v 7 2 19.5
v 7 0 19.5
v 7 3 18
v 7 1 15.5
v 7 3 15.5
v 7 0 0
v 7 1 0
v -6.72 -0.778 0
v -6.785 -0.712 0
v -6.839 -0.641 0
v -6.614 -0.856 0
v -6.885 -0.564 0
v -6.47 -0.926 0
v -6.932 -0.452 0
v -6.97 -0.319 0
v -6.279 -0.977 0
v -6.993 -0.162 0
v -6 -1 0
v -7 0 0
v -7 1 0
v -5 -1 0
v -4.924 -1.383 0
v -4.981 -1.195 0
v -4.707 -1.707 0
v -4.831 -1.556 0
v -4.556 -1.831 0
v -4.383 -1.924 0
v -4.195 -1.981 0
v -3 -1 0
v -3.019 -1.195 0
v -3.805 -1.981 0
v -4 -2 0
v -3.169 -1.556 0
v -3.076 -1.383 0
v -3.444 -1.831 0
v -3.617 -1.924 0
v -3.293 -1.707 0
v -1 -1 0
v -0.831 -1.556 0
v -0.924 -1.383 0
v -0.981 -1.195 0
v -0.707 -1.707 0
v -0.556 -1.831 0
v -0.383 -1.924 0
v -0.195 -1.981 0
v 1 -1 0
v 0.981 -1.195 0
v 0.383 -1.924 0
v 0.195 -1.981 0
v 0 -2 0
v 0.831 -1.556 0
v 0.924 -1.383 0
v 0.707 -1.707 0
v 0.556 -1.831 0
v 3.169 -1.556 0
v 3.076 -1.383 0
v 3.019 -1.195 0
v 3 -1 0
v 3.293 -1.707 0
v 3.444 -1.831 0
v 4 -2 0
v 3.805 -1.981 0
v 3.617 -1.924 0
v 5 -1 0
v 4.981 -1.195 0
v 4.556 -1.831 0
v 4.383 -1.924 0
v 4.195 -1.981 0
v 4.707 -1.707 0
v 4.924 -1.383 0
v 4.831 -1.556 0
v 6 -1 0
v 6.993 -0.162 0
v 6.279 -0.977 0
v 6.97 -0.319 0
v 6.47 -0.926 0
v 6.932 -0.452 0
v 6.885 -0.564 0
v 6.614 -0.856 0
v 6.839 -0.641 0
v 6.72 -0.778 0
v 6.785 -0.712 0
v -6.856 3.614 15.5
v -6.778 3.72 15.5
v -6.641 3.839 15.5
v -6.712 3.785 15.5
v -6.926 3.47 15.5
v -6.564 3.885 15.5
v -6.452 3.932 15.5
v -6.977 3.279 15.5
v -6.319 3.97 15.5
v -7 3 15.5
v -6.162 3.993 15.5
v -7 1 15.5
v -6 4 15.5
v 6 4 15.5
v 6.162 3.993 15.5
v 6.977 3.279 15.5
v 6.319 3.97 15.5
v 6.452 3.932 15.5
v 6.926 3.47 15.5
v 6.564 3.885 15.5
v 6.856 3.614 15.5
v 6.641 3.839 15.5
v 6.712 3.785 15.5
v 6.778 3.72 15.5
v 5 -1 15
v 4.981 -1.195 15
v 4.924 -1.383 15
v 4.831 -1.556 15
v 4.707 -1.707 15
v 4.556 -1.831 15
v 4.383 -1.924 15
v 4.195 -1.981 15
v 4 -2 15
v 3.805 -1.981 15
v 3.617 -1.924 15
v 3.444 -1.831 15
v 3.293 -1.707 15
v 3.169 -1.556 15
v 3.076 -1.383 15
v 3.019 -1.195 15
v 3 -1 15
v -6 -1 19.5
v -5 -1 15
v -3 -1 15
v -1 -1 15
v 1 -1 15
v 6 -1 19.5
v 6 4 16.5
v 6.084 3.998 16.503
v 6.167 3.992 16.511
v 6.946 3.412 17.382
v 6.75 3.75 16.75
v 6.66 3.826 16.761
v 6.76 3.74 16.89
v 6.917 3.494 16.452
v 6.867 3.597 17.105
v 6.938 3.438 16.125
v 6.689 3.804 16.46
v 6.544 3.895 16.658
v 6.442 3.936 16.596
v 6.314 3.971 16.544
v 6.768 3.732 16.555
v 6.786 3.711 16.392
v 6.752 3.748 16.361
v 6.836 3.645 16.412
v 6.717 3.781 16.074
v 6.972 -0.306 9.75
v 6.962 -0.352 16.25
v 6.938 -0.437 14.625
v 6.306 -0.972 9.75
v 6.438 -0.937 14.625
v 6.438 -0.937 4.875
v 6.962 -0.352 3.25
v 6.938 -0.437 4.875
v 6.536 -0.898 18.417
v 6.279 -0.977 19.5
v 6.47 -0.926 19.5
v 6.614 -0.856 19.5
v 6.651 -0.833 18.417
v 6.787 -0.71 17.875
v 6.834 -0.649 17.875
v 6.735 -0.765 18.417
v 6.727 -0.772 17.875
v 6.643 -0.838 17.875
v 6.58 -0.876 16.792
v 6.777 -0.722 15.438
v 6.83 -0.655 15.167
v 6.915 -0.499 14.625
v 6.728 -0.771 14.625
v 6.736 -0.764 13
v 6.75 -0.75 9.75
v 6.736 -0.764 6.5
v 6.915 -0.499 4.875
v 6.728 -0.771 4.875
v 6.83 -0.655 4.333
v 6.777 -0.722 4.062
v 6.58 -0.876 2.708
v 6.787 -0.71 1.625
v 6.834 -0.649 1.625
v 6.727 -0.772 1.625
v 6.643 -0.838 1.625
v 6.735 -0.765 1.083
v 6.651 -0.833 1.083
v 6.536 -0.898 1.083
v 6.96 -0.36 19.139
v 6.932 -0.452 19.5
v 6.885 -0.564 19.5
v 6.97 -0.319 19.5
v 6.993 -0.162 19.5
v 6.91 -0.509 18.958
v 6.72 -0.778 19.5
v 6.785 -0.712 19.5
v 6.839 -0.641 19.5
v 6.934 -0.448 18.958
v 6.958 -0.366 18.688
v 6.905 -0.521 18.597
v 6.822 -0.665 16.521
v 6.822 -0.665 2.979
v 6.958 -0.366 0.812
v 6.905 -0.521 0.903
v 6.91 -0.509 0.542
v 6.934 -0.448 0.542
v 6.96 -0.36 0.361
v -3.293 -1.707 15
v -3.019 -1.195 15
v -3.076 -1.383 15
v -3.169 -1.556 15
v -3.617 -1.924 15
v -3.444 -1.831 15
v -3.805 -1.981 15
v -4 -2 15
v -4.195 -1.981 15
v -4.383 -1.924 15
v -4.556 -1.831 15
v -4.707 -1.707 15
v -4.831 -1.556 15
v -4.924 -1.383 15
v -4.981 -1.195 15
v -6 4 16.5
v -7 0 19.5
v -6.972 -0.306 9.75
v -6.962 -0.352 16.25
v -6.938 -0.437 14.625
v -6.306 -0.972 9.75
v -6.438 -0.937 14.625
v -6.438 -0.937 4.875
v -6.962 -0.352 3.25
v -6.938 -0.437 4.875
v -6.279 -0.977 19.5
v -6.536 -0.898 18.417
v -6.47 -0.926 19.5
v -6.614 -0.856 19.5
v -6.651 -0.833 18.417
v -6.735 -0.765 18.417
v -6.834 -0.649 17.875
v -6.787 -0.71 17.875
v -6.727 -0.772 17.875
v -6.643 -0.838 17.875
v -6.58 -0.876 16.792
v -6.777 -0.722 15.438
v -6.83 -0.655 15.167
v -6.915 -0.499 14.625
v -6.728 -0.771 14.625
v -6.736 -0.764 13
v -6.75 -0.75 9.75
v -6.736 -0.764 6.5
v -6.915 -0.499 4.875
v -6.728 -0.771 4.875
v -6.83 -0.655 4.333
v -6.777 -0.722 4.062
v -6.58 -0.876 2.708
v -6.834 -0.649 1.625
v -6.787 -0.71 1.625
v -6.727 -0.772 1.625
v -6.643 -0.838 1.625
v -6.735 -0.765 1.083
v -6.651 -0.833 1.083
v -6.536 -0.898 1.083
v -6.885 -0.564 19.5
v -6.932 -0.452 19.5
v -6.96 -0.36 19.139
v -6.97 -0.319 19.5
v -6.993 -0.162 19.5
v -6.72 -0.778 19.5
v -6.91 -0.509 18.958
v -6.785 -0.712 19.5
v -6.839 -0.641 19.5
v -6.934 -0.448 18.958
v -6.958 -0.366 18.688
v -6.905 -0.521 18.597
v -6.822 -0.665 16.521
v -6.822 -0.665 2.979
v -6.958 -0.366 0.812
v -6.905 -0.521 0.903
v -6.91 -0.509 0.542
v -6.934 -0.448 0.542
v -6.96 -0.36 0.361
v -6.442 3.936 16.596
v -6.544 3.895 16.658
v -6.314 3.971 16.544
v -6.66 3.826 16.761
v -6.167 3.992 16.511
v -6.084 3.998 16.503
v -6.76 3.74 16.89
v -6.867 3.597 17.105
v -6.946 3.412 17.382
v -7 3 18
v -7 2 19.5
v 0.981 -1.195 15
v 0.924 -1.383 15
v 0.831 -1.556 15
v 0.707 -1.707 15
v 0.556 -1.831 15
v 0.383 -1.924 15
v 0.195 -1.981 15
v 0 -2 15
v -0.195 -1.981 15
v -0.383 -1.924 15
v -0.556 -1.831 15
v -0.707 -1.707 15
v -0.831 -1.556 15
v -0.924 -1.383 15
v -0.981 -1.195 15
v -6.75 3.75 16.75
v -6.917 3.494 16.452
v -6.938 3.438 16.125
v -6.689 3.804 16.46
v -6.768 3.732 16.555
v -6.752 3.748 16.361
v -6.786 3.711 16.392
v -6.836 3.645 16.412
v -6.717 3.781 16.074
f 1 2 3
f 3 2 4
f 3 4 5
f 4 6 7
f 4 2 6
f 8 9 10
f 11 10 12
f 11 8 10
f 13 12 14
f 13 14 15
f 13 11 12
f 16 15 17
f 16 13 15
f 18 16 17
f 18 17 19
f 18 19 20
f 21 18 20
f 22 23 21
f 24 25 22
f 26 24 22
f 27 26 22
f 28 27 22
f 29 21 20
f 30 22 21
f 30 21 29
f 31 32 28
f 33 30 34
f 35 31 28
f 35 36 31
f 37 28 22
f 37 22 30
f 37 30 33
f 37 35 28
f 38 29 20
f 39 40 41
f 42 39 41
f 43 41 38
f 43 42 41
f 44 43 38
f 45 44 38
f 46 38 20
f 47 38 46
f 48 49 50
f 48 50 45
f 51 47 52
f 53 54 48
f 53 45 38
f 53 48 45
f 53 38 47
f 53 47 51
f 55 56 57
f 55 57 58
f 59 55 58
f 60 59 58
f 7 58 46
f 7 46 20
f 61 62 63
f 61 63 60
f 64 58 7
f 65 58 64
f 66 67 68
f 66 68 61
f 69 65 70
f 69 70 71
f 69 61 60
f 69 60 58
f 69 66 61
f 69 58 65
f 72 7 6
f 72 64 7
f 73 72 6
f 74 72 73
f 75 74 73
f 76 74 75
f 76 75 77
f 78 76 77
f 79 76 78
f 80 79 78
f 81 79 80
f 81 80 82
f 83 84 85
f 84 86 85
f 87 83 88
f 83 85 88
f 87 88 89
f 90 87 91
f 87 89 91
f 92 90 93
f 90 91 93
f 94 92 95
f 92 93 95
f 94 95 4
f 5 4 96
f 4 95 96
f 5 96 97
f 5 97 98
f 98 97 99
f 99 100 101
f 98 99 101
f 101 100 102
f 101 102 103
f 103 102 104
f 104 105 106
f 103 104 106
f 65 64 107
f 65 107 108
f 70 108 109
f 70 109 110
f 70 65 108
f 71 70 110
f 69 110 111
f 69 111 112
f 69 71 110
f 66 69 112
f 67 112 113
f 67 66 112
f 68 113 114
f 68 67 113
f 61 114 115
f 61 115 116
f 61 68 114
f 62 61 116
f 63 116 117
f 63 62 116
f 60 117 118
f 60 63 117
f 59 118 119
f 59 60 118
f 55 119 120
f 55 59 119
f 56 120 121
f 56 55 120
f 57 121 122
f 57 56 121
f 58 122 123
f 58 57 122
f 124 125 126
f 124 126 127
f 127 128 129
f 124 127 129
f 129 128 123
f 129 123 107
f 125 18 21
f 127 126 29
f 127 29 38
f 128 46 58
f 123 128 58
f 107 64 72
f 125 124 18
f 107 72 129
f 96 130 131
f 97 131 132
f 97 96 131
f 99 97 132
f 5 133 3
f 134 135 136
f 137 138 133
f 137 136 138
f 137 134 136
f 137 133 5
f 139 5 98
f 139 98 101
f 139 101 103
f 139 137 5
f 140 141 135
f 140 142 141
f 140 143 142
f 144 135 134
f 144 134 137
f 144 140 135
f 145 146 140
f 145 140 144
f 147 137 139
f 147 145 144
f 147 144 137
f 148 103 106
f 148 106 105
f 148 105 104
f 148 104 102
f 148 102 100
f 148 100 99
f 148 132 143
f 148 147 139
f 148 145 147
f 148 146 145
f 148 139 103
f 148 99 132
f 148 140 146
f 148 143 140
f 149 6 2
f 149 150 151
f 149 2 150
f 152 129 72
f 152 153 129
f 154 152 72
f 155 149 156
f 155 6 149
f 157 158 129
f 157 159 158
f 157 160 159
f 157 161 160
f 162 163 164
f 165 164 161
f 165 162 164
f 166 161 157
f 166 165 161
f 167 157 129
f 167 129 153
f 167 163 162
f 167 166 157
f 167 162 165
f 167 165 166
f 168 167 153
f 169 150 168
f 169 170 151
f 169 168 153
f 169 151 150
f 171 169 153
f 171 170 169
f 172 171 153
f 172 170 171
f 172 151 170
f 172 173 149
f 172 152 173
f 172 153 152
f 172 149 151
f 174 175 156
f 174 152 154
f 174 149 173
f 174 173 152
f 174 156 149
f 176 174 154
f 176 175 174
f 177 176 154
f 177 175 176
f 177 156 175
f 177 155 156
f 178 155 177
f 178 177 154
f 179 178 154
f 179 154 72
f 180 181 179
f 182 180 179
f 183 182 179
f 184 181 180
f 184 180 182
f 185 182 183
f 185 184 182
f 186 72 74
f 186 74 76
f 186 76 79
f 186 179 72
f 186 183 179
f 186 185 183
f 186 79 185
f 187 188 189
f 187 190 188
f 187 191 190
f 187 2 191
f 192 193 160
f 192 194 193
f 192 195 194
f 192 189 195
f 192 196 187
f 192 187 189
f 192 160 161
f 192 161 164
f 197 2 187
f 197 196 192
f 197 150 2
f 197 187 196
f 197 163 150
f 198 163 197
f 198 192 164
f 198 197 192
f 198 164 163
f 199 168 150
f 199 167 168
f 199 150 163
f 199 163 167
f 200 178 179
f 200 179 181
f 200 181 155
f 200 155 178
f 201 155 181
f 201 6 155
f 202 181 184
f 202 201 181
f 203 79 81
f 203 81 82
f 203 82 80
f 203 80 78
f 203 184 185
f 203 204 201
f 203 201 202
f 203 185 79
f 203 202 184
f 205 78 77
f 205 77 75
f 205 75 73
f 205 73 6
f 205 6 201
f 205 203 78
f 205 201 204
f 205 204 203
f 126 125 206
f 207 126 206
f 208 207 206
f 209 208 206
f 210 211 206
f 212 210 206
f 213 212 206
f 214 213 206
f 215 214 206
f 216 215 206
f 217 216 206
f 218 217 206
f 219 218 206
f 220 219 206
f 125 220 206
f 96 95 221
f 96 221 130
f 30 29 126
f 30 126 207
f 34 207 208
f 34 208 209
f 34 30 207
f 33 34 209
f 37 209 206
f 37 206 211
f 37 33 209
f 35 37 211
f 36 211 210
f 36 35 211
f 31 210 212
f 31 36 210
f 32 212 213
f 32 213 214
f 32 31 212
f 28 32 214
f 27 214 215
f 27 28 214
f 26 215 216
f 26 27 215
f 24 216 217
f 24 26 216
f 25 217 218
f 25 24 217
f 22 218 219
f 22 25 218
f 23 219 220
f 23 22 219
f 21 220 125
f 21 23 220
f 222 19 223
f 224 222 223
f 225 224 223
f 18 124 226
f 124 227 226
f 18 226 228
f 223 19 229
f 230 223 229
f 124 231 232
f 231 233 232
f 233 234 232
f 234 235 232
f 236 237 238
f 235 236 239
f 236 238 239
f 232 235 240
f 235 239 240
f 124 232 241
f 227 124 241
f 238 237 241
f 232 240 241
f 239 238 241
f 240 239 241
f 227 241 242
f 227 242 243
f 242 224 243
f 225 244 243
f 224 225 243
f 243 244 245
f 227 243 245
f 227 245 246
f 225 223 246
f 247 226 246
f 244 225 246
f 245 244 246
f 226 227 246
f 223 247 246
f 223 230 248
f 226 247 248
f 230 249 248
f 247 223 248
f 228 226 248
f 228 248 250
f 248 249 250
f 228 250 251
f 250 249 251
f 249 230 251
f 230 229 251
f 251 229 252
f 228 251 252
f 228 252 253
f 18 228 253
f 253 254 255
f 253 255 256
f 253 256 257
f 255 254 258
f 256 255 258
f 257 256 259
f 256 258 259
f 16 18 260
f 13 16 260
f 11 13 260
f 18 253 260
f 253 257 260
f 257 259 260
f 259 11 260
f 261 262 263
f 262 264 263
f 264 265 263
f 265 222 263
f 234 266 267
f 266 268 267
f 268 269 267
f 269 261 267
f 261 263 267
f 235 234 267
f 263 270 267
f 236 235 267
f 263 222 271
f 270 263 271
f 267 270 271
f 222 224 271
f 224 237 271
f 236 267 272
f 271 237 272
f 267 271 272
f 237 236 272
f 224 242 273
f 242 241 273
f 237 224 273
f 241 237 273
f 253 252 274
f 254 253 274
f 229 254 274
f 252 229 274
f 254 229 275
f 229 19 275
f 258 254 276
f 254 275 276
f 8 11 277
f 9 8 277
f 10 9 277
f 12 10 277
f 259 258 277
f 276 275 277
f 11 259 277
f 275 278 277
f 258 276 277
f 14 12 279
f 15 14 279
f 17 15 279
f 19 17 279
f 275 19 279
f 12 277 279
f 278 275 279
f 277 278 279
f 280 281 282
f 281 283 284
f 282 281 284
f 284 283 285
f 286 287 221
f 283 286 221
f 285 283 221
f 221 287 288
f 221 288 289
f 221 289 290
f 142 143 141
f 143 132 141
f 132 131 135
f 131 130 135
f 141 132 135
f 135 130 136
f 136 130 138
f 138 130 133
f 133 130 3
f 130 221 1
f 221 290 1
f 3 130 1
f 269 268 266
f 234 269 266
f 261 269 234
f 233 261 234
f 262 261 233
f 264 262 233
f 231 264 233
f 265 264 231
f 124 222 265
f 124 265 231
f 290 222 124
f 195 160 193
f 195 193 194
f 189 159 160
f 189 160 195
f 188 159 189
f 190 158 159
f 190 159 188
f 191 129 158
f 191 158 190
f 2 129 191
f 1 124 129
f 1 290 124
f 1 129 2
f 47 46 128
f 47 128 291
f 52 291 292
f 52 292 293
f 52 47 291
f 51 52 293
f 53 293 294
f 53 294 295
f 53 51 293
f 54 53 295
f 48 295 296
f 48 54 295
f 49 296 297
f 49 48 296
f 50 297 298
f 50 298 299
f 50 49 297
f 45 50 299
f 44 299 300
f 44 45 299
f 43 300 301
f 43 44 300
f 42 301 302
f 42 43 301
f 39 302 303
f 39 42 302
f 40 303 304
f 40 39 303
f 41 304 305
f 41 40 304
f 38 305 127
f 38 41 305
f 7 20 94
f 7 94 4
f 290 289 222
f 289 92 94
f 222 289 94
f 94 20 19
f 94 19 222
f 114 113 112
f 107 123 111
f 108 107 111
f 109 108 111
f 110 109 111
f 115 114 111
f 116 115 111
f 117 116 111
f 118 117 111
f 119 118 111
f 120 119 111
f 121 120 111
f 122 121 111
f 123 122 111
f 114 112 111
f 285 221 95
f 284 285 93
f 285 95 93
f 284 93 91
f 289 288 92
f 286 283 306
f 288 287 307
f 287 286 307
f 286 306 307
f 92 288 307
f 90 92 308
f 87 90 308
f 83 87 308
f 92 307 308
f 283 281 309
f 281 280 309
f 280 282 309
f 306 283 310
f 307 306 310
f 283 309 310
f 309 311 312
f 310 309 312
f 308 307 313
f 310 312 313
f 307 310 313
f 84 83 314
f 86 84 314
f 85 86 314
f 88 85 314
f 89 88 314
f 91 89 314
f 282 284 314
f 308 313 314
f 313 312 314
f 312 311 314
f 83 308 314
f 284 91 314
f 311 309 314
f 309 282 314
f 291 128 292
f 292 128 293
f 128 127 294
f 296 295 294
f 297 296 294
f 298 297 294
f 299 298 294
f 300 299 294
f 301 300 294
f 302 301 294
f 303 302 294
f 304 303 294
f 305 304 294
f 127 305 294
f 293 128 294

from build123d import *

# Parameters (mm, degrees)
F0_W        = 14
F0_H        = 2
F1_DEPTH    = 15.5
F2_W        = 14
F2_H        = 3
F2_H_2      = 2
F3_DEPTH    = 4
F4_SIZE2    = 2
F4_SIZE     = 3
F5_T1_DEPTH = 24.5
F5_T3_DEPTH = 6
F7_DEPTH    = 15


# Not quite as in the source:
# - a fillet or chamfer that OpenCascade refuses, or shapes differently, is made with other operations: its cross-section is extruded or revolved along the edge and cut away or added


with BuildPart() as f1:
    # F0 (on Top) → F1 (new body)
    with BuildSketch(Plane.XY):
        Rectangle(F0_W, F0_H)
    extrude(amount=F1_DEPTH)

    # F2 (on face) → F3 (join)
    with BuildSketch(Plane.XY.offset(15.5)):
        with Locations((0, 2.5)):
            Rectangle(F2_W, F2_H)
        Rectangle(F2_W, F2_H_2)
    extrude(amount=F3_DEPTH)

    # F4
    f4_edges = [f1.edges().sort_by_distance(p)[0] for p in [
        (0, 4, 19.5),
    ]]
    f4_side = f1.faces().sort_by_distance((0, 4, 17.5))[0]
    chamfer(f4_edges, length=F4_SIZE, length2=F4_SIZE2, reference=f4_side)

    # F5: fillet of radius 1 on 4 edges, made by hand

    # F5_s2 → F5_t1 (cut)
    with BuildSketch(Plane.XY.offset(-2.5)):
        with BuildLine():
            add(Edge.make_bspline(
                [(-7, 0), (-7, -1), (-6, -1)],
                knots=[0, 0, 0, 1, 1, 1], degree=2, weights=[1, 1, 1]))
            Line((-6, -1), (-7, -1))
            Line((-7, -1), (-7, 0))
        make_face()
        with BuildLine():
            add(Edge.make_bspline(
                [(7, 0), (7, -1), (6, -1)],
                knots=[0, 0, 0, 1, 1, 1], degree=2, weights=[1, 1, 1]))
            Line((6, -1), (7, -1))
            Line((7, -1), (7, 0))
        make_face()
    extrude(amount=F5_T1_DEPTH, mode=Mode.SUBTRACT)

    # F5_s4 → F5_t3 (cut)
    with BuildSketch(Plane.XY.offset(13)):
        with BuildLine():
            add(Edge.make_bspline(
                [(-6, 4), (-7, 4), (-7, 3)],
                knots=[0, 0, 0, 1, 1, 1], degree=2, weights=[1, 1, 1]))
            Line((-7, 3), (-7, 4))
            Line((-7, 4), (-6, 4))
        make_face()
        with BuildLine():
            add(Edge.make_bspline(
                [(6, 4), (7, 4), (7, 3)],
                knots=[0, 0, 0, 1, 1, 1], degree=2, weights=[1, 1, 1]))
            Line((7, 3), (7, 4))
            Line((7, 4), (6, 4))
        make_face()
    extrude(amount=F5_T3_DEPTH, mode=Mode.SUBTRACT)

    # F6 (on face) → F7 (join)
    with BuildSketch(Plane(origin=(0, 0, 0), x_dir=(1, 0, 0), z_dir=(0, 0, -1))):
        with BuildLine():
            Line((-1, 1), (1, 1))
            ThreePointArc((1, 1), (0, 2), (-1, 1))
        make_face()
        with BuildLine():
            Line((5, 1), (3, 1))
            ThreePointArc((3, 1), (4, 0), (5, 1))
        make_face()
        with BuildLine():
            ThreePointArc((5, 1), (4, 2), (3, 1))
            Line((3, 1), (5, 1))
        make_face()
        with BuildLine():
            Line((-5, 1), (-3, 1))
            ThreePointArc((-3, 1), (-4, 2), (-5, 1))
        make_face()
    extrude(amount=-F7_DEPTH)


solid = f1.part
